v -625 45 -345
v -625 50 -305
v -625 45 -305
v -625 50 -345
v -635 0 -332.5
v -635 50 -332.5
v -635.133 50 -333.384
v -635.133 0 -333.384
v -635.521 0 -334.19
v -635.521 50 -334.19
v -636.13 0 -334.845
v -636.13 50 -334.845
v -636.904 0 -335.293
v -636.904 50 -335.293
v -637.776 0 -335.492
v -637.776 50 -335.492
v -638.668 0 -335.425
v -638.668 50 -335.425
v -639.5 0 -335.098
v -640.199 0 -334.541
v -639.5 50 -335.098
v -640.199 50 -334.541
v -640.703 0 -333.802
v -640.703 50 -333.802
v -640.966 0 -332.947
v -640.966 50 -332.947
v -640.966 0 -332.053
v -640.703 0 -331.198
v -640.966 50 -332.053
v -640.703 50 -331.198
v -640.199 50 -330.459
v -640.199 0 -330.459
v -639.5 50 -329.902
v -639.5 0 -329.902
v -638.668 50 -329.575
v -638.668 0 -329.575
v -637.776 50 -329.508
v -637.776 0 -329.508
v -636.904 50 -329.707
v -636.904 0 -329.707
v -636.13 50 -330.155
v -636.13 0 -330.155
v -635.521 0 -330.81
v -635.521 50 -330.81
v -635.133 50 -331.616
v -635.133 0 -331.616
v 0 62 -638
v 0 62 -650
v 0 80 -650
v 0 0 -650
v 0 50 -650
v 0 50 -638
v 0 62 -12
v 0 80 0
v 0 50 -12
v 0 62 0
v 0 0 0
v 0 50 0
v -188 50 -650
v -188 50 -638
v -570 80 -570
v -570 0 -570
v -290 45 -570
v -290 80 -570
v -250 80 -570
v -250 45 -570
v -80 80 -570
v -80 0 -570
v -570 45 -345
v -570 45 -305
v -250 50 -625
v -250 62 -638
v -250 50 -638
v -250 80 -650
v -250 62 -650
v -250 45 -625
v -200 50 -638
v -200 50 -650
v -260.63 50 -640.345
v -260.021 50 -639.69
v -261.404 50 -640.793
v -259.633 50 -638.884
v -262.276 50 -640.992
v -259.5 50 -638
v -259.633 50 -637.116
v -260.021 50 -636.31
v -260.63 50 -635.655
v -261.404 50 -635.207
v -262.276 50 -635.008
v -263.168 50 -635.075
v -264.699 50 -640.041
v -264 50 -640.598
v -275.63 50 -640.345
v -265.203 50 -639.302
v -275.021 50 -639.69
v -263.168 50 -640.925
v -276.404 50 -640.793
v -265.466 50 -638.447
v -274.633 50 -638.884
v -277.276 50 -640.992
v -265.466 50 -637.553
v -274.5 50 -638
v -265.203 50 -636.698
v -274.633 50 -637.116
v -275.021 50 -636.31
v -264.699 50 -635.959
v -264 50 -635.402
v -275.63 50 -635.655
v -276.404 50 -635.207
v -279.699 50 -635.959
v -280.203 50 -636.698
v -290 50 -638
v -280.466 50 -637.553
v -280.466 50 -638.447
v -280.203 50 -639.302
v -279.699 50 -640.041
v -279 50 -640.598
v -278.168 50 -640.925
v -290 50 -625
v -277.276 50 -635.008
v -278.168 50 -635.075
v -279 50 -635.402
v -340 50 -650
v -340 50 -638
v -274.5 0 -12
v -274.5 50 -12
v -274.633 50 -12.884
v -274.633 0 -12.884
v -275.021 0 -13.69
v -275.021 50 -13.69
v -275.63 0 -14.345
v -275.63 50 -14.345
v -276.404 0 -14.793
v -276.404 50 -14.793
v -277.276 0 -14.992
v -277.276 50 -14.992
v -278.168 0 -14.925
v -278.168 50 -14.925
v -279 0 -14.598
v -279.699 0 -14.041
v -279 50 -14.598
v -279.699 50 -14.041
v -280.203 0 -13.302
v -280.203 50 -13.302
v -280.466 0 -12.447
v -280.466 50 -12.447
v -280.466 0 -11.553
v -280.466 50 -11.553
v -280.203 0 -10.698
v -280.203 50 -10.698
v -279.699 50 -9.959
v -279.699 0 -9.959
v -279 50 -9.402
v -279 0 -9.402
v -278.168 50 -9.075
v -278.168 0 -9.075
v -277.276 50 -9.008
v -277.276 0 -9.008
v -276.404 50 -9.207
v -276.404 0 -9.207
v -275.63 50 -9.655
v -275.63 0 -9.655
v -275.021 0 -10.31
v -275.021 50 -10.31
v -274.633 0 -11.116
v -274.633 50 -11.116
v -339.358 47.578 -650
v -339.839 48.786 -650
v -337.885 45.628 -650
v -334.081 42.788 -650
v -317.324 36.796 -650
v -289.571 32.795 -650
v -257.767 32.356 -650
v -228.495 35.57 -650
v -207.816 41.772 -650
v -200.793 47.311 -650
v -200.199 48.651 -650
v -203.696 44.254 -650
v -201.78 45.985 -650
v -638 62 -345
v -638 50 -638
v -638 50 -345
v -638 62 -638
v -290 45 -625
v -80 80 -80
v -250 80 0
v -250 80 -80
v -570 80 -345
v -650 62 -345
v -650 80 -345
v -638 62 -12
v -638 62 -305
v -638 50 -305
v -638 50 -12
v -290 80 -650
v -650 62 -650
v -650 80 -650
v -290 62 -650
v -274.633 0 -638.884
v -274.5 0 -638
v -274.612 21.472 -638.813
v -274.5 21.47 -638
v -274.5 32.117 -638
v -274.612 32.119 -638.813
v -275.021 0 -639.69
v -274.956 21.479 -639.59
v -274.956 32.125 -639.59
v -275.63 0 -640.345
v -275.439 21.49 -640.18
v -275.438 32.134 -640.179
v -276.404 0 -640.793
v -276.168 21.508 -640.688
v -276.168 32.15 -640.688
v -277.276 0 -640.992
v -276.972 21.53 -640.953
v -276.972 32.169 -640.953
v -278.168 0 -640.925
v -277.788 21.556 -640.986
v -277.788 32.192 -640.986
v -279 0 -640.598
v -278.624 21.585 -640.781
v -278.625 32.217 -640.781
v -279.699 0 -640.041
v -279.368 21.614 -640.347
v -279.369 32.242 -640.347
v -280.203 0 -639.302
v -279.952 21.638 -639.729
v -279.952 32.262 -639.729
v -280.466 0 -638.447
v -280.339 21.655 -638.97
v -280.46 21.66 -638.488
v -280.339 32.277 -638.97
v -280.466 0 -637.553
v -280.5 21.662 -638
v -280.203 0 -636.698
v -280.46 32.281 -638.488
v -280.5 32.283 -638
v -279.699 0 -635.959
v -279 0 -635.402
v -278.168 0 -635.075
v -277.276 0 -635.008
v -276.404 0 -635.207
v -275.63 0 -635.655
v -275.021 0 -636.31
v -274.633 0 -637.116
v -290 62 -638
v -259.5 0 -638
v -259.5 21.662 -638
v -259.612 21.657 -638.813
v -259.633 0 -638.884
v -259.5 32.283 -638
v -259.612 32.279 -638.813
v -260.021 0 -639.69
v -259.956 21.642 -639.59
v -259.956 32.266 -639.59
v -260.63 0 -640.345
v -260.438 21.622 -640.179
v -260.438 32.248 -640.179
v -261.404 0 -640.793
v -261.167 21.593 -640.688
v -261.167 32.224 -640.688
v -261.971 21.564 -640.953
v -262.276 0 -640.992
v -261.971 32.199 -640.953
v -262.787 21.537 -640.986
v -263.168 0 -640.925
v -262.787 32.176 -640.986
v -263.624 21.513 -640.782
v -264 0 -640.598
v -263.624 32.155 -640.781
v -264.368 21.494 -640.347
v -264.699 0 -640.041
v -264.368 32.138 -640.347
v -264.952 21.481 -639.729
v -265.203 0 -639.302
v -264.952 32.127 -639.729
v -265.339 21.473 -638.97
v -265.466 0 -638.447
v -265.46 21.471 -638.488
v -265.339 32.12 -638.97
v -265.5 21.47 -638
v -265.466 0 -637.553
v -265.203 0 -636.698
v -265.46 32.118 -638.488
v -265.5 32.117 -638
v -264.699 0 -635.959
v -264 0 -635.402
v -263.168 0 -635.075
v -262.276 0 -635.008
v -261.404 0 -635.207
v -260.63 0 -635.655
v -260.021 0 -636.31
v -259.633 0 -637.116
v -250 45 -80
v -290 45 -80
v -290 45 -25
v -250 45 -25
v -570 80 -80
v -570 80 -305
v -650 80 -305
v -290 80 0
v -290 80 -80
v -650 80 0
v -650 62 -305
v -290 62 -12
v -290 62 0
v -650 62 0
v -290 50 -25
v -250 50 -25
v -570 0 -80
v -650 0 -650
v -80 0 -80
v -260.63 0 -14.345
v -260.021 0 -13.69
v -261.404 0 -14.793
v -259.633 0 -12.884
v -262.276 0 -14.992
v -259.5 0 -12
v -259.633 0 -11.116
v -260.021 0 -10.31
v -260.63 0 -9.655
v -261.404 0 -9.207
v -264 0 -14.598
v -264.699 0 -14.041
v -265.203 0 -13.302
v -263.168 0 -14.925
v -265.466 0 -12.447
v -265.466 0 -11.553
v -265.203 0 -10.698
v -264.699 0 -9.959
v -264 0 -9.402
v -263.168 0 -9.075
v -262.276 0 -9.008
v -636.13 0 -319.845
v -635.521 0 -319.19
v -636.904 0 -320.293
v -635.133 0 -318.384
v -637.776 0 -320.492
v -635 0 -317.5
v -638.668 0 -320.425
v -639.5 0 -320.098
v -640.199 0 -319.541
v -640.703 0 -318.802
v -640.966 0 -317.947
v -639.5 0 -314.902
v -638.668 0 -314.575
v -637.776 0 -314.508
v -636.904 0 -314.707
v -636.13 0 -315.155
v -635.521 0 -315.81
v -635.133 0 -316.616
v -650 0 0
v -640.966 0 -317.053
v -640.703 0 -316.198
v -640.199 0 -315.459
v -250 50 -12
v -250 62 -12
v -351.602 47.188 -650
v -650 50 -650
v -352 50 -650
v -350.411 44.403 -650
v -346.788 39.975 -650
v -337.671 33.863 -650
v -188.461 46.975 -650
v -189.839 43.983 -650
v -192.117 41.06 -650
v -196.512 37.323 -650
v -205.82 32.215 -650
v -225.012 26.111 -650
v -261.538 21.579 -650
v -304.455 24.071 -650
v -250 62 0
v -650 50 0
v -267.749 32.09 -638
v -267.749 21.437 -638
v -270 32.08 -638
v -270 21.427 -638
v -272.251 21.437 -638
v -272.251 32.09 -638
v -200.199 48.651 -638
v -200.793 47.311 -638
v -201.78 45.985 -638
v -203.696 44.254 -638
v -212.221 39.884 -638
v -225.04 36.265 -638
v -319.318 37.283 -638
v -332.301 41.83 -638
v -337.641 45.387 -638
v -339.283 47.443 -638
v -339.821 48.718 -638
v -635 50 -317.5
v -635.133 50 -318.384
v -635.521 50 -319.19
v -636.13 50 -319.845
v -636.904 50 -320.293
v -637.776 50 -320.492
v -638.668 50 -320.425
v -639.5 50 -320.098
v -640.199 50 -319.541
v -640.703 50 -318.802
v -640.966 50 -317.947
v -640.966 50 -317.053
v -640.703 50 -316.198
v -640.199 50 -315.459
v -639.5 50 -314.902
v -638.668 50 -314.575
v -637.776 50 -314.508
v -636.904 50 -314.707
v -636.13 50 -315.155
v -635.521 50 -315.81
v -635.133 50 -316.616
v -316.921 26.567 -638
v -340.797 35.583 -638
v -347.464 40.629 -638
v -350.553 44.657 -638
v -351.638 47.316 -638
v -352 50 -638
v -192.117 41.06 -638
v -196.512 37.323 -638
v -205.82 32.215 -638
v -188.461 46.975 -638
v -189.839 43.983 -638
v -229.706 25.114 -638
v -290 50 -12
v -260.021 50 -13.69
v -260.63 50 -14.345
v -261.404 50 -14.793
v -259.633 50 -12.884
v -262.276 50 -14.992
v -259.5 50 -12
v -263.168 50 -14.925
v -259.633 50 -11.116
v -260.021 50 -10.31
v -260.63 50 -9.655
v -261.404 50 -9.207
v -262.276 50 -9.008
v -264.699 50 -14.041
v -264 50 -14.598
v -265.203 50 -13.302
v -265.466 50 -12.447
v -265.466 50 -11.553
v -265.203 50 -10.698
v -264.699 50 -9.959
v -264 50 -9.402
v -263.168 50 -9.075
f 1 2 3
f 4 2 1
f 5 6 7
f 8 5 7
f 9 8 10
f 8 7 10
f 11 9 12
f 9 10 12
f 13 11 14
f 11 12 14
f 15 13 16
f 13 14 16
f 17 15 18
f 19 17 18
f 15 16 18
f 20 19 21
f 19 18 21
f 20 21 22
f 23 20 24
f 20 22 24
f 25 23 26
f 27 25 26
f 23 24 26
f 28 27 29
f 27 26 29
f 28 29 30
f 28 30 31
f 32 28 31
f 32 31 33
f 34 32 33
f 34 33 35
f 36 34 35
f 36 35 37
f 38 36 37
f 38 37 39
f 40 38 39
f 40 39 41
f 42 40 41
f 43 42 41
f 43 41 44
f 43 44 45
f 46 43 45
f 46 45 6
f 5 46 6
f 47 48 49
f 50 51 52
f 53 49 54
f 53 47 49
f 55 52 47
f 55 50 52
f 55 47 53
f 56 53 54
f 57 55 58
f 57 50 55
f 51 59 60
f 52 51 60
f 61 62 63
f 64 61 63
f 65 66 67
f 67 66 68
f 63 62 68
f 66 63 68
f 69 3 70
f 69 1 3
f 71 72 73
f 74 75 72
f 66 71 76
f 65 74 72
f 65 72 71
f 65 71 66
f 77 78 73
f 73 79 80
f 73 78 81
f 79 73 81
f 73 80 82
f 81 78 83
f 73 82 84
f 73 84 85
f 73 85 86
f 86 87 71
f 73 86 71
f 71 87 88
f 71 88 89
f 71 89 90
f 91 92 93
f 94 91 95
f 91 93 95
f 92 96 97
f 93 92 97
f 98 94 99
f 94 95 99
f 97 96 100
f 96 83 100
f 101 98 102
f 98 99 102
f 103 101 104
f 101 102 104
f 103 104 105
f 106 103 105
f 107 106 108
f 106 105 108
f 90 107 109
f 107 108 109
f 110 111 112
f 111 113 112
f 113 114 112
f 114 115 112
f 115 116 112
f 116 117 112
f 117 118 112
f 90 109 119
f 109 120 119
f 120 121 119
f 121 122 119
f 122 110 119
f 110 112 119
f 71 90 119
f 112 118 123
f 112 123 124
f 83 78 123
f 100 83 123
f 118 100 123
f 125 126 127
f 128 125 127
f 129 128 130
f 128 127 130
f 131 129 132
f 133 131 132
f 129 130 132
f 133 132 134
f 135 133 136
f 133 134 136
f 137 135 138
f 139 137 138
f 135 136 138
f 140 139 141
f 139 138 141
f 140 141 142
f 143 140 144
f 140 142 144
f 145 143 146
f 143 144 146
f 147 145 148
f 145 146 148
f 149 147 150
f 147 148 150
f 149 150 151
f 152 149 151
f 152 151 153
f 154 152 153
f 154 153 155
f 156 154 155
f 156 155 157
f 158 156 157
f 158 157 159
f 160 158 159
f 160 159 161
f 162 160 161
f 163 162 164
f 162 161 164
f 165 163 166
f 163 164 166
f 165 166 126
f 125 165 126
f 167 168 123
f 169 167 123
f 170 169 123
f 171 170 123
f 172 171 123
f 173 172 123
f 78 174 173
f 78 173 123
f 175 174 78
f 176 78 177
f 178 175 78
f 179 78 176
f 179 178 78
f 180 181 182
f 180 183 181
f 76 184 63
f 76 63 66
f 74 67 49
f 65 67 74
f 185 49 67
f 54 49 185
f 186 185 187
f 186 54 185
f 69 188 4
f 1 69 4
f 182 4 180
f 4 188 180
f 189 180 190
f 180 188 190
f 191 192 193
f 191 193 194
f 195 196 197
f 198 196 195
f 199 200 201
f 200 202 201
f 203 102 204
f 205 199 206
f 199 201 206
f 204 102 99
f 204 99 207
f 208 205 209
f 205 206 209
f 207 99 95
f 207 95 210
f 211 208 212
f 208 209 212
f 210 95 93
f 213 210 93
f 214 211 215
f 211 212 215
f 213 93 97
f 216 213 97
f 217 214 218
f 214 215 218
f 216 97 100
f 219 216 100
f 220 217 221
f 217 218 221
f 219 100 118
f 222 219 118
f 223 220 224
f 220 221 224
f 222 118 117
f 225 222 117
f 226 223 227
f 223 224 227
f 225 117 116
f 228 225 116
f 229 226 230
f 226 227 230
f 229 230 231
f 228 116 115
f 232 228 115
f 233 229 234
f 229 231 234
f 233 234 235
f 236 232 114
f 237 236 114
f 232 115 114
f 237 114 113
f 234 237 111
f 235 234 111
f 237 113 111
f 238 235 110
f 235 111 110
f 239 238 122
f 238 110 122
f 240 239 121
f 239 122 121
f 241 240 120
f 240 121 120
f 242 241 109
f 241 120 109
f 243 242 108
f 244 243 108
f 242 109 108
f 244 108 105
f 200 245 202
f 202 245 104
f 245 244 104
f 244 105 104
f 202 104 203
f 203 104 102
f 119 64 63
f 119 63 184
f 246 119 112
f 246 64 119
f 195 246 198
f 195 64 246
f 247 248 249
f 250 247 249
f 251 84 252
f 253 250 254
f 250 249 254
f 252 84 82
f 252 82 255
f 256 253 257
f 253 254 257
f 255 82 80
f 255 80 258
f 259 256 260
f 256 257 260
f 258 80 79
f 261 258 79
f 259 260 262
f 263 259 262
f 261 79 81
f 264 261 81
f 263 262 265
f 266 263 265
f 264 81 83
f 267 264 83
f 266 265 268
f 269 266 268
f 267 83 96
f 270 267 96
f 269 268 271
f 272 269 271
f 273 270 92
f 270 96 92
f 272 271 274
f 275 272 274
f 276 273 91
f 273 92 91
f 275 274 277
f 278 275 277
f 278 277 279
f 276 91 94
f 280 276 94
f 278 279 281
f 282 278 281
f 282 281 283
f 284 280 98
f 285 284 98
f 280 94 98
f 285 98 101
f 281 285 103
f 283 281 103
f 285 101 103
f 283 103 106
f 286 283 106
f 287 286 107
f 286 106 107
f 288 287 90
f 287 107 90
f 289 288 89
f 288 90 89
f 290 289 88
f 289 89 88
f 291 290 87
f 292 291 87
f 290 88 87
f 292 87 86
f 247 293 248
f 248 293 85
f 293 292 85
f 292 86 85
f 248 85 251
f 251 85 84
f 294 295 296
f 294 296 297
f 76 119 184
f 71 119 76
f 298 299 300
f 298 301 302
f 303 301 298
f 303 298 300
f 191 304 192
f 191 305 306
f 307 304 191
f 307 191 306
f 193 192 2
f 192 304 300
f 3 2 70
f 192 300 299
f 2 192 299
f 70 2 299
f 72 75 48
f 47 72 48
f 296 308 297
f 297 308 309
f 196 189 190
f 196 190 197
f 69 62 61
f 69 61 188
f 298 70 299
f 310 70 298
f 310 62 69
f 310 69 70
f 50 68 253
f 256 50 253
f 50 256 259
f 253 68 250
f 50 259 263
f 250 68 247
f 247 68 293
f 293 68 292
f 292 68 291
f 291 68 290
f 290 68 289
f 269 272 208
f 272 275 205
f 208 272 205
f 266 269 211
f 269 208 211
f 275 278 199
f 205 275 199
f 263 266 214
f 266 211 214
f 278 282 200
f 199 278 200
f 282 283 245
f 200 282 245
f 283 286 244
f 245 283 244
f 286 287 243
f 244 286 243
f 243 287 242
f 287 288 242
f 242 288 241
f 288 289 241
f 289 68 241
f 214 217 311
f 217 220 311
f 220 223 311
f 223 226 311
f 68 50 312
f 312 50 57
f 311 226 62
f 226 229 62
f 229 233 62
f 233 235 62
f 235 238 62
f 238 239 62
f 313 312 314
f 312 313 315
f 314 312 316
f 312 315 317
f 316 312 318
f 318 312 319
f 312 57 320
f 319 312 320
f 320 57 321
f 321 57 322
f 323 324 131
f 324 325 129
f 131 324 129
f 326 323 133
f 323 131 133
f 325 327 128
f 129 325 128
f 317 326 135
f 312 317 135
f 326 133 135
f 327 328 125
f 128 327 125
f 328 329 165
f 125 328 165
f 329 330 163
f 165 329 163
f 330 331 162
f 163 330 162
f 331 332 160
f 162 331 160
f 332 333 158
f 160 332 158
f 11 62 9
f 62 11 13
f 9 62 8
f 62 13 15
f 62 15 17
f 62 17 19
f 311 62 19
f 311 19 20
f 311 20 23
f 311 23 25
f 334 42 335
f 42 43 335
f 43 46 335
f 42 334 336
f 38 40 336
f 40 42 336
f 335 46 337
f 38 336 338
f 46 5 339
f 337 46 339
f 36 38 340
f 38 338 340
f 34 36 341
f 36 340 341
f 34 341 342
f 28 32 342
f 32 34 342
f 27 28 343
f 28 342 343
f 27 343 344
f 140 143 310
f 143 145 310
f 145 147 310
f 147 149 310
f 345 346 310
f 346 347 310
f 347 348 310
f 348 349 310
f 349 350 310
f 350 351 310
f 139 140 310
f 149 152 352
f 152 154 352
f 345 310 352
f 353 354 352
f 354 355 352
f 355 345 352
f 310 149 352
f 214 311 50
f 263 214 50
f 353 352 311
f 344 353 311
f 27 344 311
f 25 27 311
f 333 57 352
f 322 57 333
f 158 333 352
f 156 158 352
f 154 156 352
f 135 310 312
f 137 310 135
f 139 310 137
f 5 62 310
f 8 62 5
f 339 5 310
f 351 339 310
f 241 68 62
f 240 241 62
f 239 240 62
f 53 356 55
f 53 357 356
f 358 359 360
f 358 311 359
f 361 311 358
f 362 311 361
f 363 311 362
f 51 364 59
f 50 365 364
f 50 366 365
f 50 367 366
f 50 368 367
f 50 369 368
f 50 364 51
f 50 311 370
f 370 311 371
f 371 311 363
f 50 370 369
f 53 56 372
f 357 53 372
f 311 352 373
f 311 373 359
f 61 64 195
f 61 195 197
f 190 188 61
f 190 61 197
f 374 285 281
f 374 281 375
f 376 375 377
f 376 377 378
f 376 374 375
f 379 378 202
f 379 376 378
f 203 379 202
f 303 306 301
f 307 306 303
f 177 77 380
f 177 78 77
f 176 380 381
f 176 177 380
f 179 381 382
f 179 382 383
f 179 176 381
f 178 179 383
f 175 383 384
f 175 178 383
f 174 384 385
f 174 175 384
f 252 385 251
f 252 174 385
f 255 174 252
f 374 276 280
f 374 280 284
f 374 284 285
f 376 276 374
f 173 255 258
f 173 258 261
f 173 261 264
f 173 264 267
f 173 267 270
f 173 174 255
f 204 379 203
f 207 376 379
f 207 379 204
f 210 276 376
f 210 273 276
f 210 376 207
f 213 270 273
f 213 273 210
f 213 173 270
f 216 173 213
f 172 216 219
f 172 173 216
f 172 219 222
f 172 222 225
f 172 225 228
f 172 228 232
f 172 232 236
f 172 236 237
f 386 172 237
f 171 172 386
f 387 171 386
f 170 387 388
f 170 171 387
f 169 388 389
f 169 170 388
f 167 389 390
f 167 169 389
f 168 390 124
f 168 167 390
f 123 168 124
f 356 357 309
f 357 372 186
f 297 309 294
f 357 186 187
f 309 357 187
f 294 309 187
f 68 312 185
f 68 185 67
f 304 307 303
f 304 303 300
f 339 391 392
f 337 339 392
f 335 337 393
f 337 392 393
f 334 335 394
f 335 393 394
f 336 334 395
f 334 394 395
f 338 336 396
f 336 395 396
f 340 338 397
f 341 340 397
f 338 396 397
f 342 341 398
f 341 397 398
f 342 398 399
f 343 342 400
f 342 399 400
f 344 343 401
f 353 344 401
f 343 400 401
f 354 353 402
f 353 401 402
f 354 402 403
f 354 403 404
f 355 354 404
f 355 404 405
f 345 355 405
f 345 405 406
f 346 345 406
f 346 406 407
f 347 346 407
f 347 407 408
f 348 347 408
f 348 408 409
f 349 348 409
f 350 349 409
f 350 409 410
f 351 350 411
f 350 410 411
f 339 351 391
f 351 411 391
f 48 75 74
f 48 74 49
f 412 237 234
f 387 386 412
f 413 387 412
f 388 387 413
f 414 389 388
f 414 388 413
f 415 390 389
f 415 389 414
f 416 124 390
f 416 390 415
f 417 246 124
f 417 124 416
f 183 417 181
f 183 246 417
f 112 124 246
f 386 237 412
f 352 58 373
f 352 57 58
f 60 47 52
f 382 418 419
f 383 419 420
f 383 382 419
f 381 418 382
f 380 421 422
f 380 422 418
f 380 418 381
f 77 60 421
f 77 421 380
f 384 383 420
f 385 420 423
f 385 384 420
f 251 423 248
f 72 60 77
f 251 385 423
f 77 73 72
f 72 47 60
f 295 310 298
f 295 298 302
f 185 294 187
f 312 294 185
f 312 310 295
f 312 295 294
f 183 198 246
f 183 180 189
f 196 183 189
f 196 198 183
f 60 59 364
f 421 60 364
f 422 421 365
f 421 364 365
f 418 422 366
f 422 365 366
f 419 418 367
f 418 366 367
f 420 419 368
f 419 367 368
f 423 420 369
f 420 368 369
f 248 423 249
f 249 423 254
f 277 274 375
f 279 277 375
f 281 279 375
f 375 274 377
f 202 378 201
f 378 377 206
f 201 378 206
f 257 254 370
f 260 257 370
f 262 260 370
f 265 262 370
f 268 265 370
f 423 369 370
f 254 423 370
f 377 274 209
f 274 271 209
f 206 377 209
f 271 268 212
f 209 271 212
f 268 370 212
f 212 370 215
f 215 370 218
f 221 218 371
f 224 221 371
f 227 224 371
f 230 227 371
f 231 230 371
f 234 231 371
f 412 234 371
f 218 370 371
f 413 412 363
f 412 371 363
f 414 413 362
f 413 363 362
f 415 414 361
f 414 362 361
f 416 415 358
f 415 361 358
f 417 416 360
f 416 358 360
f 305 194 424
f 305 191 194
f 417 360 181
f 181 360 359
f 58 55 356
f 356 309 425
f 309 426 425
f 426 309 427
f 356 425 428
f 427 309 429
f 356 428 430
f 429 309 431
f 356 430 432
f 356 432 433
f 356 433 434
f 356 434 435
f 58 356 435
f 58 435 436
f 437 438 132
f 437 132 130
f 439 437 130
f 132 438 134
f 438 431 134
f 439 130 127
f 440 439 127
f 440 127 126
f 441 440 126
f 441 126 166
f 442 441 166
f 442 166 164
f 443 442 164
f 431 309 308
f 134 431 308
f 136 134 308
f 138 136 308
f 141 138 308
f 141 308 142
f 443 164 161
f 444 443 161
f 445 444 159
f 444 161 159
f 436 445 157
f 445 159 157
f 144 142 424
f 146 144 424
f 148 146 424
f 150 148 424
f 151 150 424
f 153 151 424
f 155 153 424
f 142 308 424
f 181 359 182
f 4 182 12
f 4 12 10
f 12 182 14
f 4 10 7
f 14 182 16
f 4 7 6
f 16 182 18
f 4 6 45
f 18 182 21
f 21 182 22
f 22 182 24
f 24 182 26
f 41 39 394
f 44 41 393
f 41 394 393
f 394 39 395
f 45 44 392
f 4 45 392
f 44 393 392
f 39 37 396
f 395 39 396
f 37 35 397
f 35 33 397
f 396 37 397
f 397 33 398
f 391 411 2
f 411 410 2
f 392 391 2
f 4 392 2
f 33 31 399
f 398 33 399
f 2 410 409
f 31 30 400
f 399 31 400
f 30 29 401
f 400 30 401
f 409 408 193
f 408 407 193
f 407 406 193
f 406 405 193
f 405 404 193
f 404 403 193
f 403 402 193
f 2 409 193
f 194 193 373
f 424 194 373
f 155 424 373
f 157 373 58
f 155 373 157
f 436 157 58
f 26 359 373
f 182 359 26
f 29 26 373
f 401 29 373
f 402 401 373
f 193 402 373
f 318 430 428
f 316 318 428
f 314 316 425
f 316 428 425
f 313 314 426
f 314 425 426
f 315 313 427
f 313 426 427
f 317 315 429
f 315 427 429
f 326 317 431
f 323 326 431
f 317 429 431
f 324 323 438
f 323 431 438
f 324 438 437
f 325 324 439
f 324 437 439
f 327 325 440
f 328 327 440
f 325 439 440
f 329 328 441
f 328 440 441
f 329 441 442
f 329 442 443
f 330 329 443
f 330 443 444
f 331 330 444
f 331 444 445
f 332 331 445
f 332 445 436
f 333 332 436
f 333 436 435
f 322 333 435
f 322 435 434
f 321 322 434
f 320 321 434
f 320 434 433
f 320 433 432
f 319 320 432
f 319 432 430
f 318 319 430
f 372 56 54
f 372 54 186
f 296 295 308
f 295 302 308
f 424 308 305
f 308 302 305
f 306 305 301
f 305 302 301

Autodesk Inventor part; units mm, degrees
ref_plane "YZ Plane" through (0, 0, 0) normal (1, 0, 0) x (0, 1, 0)
ref_plane "XZ Plane" through (0, 0, 0) normal (0, 1, 0) x (-1, 0, 0)
ref_plane "XY Plane" through (0, 0, 0) normal (0, 0, 1) x (1, 0, 0)
sketch "Skizze1" plane through (0, 0, 0) normal (0, 1, 0) x (-1, 0, 0)
  line L0 (0, 0) -> (80, 0)
  line L1 (80, 0) -> (80, -650)
  line L2 (80, -650) -> (0, -650)
  line L3 (0, -650) -> (0, 0)
  line L4 (80, -570) -> (80, -650)
  line L5 (80, -650) -> (570, -650)
  line L6 (570, -650) -> (570, -570)
  line L7 (570, -570) -> (80, -570)
  line L8 (80, -570) -> (80, -650)
  line L9 (80, 0) -> (570, 0)
  line L10 (570, 0) -> (570, -80)
  line L11 (570, -80) -> (80, -80)
  line L12 (80, -80) -> (80, 0)
  line L13 (570, 0) -> (650, 0)
  line L14 (650, 0) -> (650, -650)
  line L15 (650, -650) -> (570, -650)
  line L16 (570, -650) -> (570, 0)
  dimension "d0" = 80
  dimension "d1" = 650
  dimension "d4" = 490
  dimension "d5" = 80
  dimension "d6" = 80
  dimension "d7" = 80
extrude "Extrusion1" add sketch "Skizze1" along normal blind 80 contours L0 L1 L2 L3 | L9 L10 L11 L1 | L13 L14 L15 L6 L16 L10 | L1 L7 L6 L5
sketch "Skizze2" plane through (0, 80, 0) normal (0, 1, 0) x (1, 0, 0)
  line L0 (0, 0) -> (0, 650) projected
  line L1 (0, 650) -> (-650, 650) projected
  line L2 (-650, 650) -> (-650, 0) projected
  line L3 (-650, 0) -> (0, 0) projected
  line L4 (-80, 80) -> (-570, 80) projected
  line L5 (-570, 80) -> (-570, 570) projected
  line L6 (-570, 570) -> (-80, 570) projected
  line L7 (-80, 570) -> (-80, 80) projected
  line L8 (-490, 305) -> (-490, 345)
  line L9 (-490, 345) -> (-650, 345)
  line L10 (-650, 345) -> (-650, 305)
  line L11 (-650, 305) -> (-490, 305)
  line L12 (-570, 80) -> (-570, 570) projected
  line L13 (-490, 305) -> (-650, 345) construction
  line L14 (-490, 345) -> (-650, 305) construction
  line L15 (-80, 80) -> (-570, 80) projected
  line L16 (-570, 80) -> (-270, 80)
  line L17 (-250, 160) -> (-290, 160)
  line L18 (-290, 160) -> (-290, 0)
  line L19 (-290, 0) -> (-250, 0)
  line L20 (-250, 0) -> (-250, 160)
  line L21 (-250, 160) -> (-290, 0) construction
  line L22 (-290, 160) -> (-250, 0) construction
  line L23 (-650, 325) -> (0, 325)
  line L24 (-250, 490) -> (-290, 490)
  line L25 (-290, 490) -> (-290, 650)
  line L26 (-250, 650) -> (-250, 490)
  line L27 (-290, 650) -> (-250, 650)
  point P0 (-570, 325)
  point P1 (-250, 570)
  point P2 (-290, 570)
  point P3 (-570, 345)
  point P4 (-570, 305)
  point P5 (-250, 80)
  point P6 (-290, 80)
  dimension "d10" = 40
  dimension "d11" = 300
  dimension "d12" = 40
extrude "Extrusion2" cut sketch "Skizze2" against normal blind 30 contours L3 L18 L4 L20 | L26 L6 L25 L1 | L23 L2 L9 L5 | L5 L11 L2 L23
sketch "Skizze3" plane through (0, 50, 0) normal (0, 1, 0) x (1, 0, 0)
  line L0 (-290, 80) -> (-250, 80) projected
  line L1 (-290, 0) -> (-290, 80) projected
  line L2 (-250, 0) -> (-290, 0) projected
  line L3 (-250, 80) -> (-250, 0) projected
  line L4 (-290, 650) -> (-250, 650) projected
  line L5 (-290, 570) -> (-290, 650) projected
  line L6 (-250, 570) -> (-290, 570) projected
  line L7 (-250, 650) -> (-250, 570) projected
  line L8 (-650, 345) -> (-570, 345) projected
  line L9 (-650, 305) -> (-650, 345) projected
  line L10 (-570, 305) -> (-650, 305) projected
  line L11 (-570, 345) -> (-570, 305) projected
  line L12 (-650, 305) -> (-625, 305)
  line L13 (-570, 305) -> (-650, 305) projected
  line L14 (-625, 305) -> (-625, 345)
  line L15 (-290, 650) -> (-290, 625)
  line L16 (-290, 570) -> (-290, 650) projected
  line L17 (-290, 625) -> (-250, 625)
  line L18 (-290, 0) -> (-290, 25)
  line L19 (-290, 25) -> (-250, 25)
  point P0 (0, 0)
  dimension "d15" = 25
  dimension "d16" = 25
  dimension "d17" = 25
extrude "Extrusion3" cut sketch "Skizze3" against normal blind 5 contours L0 L3 L19 L1 | L17 L7 L6 L5 | L8 L11 L10 L14
sketch "Skizze4" plane through (0, 0, -650) normal (0, 0, -1) x (-1, 0, 0)
  line L0 (290, 80) -> (290, 50) projected
  line L1 (290, 50) -> (250, 50) projected
  line L2 (250, 50) -> (250, 80) projected
  line L3 (0, 80) -> (250, 80) projected
  line L4 (0, 0) -> (0, 80) projected
  line L5 (0, 0) -> (650, 0) projected
  line L6 (650, 0) -> (650, 80) projected
  line L7 (290, 80) -> (650, 80) projected
  line L8 (250, 50) -> (250, 45) projected
  line L9 (250, 50) -> (0, 50)
  line L10 (0, 0) -> (0, 80) projected
  line L11 (290, 50) -> (250, 50) projected
  line L12 (250, 50) -> (250, 62)
  line L13 (250, 62) -> (0, 62)
  line L14 (290, 50) -> (650, 50)
  line L15 (290, 62) -> (650, 62)
  dimension "d20" = 12
extrude "Extrusion4" cut sketch "Skizze4" against normal blind 12 contours L15 L6 L14 L0 | L9 L4 L13 L2
sketch "Skizze5" plane through (-650, 0, -650) normal (-1, 0, 0) x (0, 0, 1)
  line L0 (12, 50) -> (0, 50) projected
  line L1 (0, 0) -> (0, 50) projected
  line L2 (0, 0) -> (650, 0) projected
  line L3 (650, 0) -> (650, 80) projected
  line L4 (345, 80) -> (650, 80) projected
  line L5 (345, 80) -> (345, 50) projected
  line L6 (345, 50) -> (305, 50) projected
  line L7 (305, 50) -> (305, 80) projected
  line L8 (0, 80) -> (305, 80) projected
  line L9 (0, 62) -> (0, 80) projected
  line L10 (0, 62) -> (12, 62) projected
  line L11 (12, 62) -> (12, 50) projected
  line L12 (12, 50) -> (650, 50)
  line L13 (12, 62) -> (650, 62)
  point P0 (345, 62)
  point P1 (305, 62)
extrude "Extrusion5" cut sketch "Skizze5" against normal blind 12 contours L11 L13 L7 L12 | L5 L13 L3 L12
sketch "Skizze6" plane through (-650, 0, 0) normal (0, 0, 1) x (1, 0, 0)
  line L0 (12, 50) -> (12, 62) projected
  line L1 (12, 50) -> (650, 50)
  line L2 (360, 62) -> (12, 62) projected
  line L3 (650, 62) -> (400, 62) projected
  line L4 (12, 50) -> (0, 50) projected
  line L5 (0, 0) -> (0, 50) projected
  line L6 (0, 0) -> (650, 0) projected
  line L7 (650, 0) -> (650, 80) projected
  line L8 (400, 80) -> (650, 80) projected
  line L9 (400, 80) -> (400, 50) projected
  line L10 (400, 50) -> (360, 50) projected
  line L11 (360, 50) -> (360, 80) projected
  line L12 (0, 80) -> (360, 80) projected
  line L13 (0, 62) -> (0, 80) projected
  line L14 (0, 62) -> (12, 62) projected
  line L15 (12, 62) -> (12, 50) projected
extrude "Extrusion6" cut sketch "Skizze6" against normal blind 12 contours L0 L2 L11 L1 | L9 L3 L7 L1
sketch "Skizze7" plane through (0, 0, -650) normal (0, 0, -1) x (-1, 0, 0)
  line L0 (650, 50) -> (0, 50) projected
  line L1 (0, 0) -> (0, 50) projected
  line L2 (0, 0) -> (650, 0) projected
  line L3 (650, 0) -> (650, 50) projected
  line L4 (0, 50) -> (0, 62) projected
  line L5 (250, 50) -> (0, 50) projected
  line L6 (250, 62) -> (250, 50) projected
  line L7 (0, 62) -> (250, 62) projected
  line L8 (0, 62) -> (250, 62) projected
  line L9 (250, 62) -> (250, 80) projected
  line L10 (0, 80) -> (250, 80) projected
  line L11 (0, 62) -> (0, 80) projected
  line L12 (290, 62) -> (650, 62) projected
  line L13 (650, 62) -> (650, 80) projected
  line L14 (290, 80) -> (650, 80) projected
  line L15 (290, 80) -> (290, 62) projected
  line L16 (638, 50) -> (638, 62) projected
  line L17 (290, 62) -> (638, 62) projected
  line L18 (290, 50) -> (290, 62) projected
  line L19 (638, 50) -> (290, 50) projected
  line L20 (250, 50) -> (200, 50)
  line L21 (290, 50) -> (340, 50)
  line L22 (250, 50) -> (290, 50) projected
  ellipse E0 centre (270, 50) end of major axis (200, 50) minor radius 17.9197
  line L23 (200, 50) -> (188, 50)
  line L24 (250, 62) -> (0, 62) projected
  line L25 (218.0128, 62) -> (213.5364, 73.1338)
  ellipse E1 centre (270, 50) end of major axis (188, 50) minor radius 28.5733
  point P0 (352, 50)
  dimension "d27" = 50
  dimension "d28" = 50
  dimension "d29" = 12
  dimension "d30" = 12
extrude "Extrusion7" cut sketch "Skizze7" against normal blind 12 contours E1 L0 E0
sketch "Skizze8" plane through (0, 50, 0) normal (0, 1, 0) x (1, 0, 0)
  line L0 (-352, 638) -> (-352, 650) projected
  line L1 (-650, 650) -> (-352, 650) projected
  line L2 (-650, 0) -> (-650, 650) projected
  line L3 (0, 0) -> (-650, 0) projected
  line L4 (0, 12) -> (0, 0) projected
  line L5 (0, 12) -> (-250, 12) projected
  line L6 (-250, 25) -> (-250, 12) projected
  line L7 (-250, 25) -> (-290, 25) projected
  line L8 (-290, 12) -> (-290, 25) projected
  line L9 (-290, 12) -> (-638, 12) projected
  line L10 (-638, 12) -> (-638, 305) projected
  line L11 (-625, 305) -> (-638, 305) projected
  line L12 (-625, 305) -> (-625, 345) projected
  line L13 (-638, 345) -> (-625, 345) projected
  line L14 (-638, 345) -> (-638, 638) projected
  line L15 (-638, 638) -> (-352, 638) projected
  line L16 (-290, 25) -> (-290, 80) projected
  line L17 (-250, 25) -> (-290, 25) projected
  line L18 (-250, 80) -> (-250, 25) projected
  line L19 (-290, 80) -> (-250, 80) projected
  line L20 (-290, 0) -> (-290, 12) projected
  line L21 (-290, 12) -> (-290, 0)
  line L22 (0, 12) -> (-250, 12) projected
  line L23 (-250, 80) -> (-250, 0) projected
  line L24 (-250, 12) -> (-250, 0)
  line L25 (-250, 12) -> (-262.5, 12)
  line L26 (-262.5, 12) -> (-277.5, 12)
  circle A0 centre (-277.5, 12) radius 3
  circle A1 centre (-262.5, 12) radius 3
  line L27 (-638, 305) -> (-638, 317.5)
  line L28 (-638, 317.5) -> (-638, 332.5)
  circle A2 centre (-638, 317.5) radius 3
  circle A3 centre (-638, 332.5) radius 3
  line L29 (-340, 650) -> (-340, 638) projected
  line L30 (-340, 638) -> (-290, 638) projected
  line L31 (-290, 625) -> (-290, 638) projected
  line L32 (-290, 625) -> (-250, 625) projected
  line L33 (-250, 638) -> (-250, 625) projected
  line L34 (-250, 638) -> (-200, 638) projected
  line L35 (-200, 638) -> (-200, 650) projected
  line L36 (-340, 650) -> (-200, 650) projected
  line L37 (-290, 638) -> (-290, 625.5)
  line L38 (-290, 570) -> (-290, 650) projected
  line L39 (-290, 638) -> (-277.5, 638)
  line L40 (-277.5, 638) -> (-262.5, 638)
  circle A4 centre (-277.5, 638) radius 3
  circle A5 centre (-262.5, 638) radius 3
  dimension "d35" = 12.5
  dimension "d36" = 15
  dimension "d37" = 6
  dimension "d38" = 6
  dimension "d39" = 12.5
  dimension "d40" = 15
  dimension "d41" = 6
  dimension "d42" = 6
  dimension "d43" = 12.5
  dimension "d44" = 12.5
  dimension "d45" = 15
  dimension "d46" = 6
  dimension "d47" = 6
extrude "Extrusion8" cut sketch "Skizze8" against normal blind 100 contours A3 | A2 L28 L27 | L27 L28 A2 | A0 | A1 L26 L25 | L25 L26 A1 | A5 | A4 L40 L39 | L39 L40 A4
properties part number "Rahmen_Unten" material "Holz (Birke)"
